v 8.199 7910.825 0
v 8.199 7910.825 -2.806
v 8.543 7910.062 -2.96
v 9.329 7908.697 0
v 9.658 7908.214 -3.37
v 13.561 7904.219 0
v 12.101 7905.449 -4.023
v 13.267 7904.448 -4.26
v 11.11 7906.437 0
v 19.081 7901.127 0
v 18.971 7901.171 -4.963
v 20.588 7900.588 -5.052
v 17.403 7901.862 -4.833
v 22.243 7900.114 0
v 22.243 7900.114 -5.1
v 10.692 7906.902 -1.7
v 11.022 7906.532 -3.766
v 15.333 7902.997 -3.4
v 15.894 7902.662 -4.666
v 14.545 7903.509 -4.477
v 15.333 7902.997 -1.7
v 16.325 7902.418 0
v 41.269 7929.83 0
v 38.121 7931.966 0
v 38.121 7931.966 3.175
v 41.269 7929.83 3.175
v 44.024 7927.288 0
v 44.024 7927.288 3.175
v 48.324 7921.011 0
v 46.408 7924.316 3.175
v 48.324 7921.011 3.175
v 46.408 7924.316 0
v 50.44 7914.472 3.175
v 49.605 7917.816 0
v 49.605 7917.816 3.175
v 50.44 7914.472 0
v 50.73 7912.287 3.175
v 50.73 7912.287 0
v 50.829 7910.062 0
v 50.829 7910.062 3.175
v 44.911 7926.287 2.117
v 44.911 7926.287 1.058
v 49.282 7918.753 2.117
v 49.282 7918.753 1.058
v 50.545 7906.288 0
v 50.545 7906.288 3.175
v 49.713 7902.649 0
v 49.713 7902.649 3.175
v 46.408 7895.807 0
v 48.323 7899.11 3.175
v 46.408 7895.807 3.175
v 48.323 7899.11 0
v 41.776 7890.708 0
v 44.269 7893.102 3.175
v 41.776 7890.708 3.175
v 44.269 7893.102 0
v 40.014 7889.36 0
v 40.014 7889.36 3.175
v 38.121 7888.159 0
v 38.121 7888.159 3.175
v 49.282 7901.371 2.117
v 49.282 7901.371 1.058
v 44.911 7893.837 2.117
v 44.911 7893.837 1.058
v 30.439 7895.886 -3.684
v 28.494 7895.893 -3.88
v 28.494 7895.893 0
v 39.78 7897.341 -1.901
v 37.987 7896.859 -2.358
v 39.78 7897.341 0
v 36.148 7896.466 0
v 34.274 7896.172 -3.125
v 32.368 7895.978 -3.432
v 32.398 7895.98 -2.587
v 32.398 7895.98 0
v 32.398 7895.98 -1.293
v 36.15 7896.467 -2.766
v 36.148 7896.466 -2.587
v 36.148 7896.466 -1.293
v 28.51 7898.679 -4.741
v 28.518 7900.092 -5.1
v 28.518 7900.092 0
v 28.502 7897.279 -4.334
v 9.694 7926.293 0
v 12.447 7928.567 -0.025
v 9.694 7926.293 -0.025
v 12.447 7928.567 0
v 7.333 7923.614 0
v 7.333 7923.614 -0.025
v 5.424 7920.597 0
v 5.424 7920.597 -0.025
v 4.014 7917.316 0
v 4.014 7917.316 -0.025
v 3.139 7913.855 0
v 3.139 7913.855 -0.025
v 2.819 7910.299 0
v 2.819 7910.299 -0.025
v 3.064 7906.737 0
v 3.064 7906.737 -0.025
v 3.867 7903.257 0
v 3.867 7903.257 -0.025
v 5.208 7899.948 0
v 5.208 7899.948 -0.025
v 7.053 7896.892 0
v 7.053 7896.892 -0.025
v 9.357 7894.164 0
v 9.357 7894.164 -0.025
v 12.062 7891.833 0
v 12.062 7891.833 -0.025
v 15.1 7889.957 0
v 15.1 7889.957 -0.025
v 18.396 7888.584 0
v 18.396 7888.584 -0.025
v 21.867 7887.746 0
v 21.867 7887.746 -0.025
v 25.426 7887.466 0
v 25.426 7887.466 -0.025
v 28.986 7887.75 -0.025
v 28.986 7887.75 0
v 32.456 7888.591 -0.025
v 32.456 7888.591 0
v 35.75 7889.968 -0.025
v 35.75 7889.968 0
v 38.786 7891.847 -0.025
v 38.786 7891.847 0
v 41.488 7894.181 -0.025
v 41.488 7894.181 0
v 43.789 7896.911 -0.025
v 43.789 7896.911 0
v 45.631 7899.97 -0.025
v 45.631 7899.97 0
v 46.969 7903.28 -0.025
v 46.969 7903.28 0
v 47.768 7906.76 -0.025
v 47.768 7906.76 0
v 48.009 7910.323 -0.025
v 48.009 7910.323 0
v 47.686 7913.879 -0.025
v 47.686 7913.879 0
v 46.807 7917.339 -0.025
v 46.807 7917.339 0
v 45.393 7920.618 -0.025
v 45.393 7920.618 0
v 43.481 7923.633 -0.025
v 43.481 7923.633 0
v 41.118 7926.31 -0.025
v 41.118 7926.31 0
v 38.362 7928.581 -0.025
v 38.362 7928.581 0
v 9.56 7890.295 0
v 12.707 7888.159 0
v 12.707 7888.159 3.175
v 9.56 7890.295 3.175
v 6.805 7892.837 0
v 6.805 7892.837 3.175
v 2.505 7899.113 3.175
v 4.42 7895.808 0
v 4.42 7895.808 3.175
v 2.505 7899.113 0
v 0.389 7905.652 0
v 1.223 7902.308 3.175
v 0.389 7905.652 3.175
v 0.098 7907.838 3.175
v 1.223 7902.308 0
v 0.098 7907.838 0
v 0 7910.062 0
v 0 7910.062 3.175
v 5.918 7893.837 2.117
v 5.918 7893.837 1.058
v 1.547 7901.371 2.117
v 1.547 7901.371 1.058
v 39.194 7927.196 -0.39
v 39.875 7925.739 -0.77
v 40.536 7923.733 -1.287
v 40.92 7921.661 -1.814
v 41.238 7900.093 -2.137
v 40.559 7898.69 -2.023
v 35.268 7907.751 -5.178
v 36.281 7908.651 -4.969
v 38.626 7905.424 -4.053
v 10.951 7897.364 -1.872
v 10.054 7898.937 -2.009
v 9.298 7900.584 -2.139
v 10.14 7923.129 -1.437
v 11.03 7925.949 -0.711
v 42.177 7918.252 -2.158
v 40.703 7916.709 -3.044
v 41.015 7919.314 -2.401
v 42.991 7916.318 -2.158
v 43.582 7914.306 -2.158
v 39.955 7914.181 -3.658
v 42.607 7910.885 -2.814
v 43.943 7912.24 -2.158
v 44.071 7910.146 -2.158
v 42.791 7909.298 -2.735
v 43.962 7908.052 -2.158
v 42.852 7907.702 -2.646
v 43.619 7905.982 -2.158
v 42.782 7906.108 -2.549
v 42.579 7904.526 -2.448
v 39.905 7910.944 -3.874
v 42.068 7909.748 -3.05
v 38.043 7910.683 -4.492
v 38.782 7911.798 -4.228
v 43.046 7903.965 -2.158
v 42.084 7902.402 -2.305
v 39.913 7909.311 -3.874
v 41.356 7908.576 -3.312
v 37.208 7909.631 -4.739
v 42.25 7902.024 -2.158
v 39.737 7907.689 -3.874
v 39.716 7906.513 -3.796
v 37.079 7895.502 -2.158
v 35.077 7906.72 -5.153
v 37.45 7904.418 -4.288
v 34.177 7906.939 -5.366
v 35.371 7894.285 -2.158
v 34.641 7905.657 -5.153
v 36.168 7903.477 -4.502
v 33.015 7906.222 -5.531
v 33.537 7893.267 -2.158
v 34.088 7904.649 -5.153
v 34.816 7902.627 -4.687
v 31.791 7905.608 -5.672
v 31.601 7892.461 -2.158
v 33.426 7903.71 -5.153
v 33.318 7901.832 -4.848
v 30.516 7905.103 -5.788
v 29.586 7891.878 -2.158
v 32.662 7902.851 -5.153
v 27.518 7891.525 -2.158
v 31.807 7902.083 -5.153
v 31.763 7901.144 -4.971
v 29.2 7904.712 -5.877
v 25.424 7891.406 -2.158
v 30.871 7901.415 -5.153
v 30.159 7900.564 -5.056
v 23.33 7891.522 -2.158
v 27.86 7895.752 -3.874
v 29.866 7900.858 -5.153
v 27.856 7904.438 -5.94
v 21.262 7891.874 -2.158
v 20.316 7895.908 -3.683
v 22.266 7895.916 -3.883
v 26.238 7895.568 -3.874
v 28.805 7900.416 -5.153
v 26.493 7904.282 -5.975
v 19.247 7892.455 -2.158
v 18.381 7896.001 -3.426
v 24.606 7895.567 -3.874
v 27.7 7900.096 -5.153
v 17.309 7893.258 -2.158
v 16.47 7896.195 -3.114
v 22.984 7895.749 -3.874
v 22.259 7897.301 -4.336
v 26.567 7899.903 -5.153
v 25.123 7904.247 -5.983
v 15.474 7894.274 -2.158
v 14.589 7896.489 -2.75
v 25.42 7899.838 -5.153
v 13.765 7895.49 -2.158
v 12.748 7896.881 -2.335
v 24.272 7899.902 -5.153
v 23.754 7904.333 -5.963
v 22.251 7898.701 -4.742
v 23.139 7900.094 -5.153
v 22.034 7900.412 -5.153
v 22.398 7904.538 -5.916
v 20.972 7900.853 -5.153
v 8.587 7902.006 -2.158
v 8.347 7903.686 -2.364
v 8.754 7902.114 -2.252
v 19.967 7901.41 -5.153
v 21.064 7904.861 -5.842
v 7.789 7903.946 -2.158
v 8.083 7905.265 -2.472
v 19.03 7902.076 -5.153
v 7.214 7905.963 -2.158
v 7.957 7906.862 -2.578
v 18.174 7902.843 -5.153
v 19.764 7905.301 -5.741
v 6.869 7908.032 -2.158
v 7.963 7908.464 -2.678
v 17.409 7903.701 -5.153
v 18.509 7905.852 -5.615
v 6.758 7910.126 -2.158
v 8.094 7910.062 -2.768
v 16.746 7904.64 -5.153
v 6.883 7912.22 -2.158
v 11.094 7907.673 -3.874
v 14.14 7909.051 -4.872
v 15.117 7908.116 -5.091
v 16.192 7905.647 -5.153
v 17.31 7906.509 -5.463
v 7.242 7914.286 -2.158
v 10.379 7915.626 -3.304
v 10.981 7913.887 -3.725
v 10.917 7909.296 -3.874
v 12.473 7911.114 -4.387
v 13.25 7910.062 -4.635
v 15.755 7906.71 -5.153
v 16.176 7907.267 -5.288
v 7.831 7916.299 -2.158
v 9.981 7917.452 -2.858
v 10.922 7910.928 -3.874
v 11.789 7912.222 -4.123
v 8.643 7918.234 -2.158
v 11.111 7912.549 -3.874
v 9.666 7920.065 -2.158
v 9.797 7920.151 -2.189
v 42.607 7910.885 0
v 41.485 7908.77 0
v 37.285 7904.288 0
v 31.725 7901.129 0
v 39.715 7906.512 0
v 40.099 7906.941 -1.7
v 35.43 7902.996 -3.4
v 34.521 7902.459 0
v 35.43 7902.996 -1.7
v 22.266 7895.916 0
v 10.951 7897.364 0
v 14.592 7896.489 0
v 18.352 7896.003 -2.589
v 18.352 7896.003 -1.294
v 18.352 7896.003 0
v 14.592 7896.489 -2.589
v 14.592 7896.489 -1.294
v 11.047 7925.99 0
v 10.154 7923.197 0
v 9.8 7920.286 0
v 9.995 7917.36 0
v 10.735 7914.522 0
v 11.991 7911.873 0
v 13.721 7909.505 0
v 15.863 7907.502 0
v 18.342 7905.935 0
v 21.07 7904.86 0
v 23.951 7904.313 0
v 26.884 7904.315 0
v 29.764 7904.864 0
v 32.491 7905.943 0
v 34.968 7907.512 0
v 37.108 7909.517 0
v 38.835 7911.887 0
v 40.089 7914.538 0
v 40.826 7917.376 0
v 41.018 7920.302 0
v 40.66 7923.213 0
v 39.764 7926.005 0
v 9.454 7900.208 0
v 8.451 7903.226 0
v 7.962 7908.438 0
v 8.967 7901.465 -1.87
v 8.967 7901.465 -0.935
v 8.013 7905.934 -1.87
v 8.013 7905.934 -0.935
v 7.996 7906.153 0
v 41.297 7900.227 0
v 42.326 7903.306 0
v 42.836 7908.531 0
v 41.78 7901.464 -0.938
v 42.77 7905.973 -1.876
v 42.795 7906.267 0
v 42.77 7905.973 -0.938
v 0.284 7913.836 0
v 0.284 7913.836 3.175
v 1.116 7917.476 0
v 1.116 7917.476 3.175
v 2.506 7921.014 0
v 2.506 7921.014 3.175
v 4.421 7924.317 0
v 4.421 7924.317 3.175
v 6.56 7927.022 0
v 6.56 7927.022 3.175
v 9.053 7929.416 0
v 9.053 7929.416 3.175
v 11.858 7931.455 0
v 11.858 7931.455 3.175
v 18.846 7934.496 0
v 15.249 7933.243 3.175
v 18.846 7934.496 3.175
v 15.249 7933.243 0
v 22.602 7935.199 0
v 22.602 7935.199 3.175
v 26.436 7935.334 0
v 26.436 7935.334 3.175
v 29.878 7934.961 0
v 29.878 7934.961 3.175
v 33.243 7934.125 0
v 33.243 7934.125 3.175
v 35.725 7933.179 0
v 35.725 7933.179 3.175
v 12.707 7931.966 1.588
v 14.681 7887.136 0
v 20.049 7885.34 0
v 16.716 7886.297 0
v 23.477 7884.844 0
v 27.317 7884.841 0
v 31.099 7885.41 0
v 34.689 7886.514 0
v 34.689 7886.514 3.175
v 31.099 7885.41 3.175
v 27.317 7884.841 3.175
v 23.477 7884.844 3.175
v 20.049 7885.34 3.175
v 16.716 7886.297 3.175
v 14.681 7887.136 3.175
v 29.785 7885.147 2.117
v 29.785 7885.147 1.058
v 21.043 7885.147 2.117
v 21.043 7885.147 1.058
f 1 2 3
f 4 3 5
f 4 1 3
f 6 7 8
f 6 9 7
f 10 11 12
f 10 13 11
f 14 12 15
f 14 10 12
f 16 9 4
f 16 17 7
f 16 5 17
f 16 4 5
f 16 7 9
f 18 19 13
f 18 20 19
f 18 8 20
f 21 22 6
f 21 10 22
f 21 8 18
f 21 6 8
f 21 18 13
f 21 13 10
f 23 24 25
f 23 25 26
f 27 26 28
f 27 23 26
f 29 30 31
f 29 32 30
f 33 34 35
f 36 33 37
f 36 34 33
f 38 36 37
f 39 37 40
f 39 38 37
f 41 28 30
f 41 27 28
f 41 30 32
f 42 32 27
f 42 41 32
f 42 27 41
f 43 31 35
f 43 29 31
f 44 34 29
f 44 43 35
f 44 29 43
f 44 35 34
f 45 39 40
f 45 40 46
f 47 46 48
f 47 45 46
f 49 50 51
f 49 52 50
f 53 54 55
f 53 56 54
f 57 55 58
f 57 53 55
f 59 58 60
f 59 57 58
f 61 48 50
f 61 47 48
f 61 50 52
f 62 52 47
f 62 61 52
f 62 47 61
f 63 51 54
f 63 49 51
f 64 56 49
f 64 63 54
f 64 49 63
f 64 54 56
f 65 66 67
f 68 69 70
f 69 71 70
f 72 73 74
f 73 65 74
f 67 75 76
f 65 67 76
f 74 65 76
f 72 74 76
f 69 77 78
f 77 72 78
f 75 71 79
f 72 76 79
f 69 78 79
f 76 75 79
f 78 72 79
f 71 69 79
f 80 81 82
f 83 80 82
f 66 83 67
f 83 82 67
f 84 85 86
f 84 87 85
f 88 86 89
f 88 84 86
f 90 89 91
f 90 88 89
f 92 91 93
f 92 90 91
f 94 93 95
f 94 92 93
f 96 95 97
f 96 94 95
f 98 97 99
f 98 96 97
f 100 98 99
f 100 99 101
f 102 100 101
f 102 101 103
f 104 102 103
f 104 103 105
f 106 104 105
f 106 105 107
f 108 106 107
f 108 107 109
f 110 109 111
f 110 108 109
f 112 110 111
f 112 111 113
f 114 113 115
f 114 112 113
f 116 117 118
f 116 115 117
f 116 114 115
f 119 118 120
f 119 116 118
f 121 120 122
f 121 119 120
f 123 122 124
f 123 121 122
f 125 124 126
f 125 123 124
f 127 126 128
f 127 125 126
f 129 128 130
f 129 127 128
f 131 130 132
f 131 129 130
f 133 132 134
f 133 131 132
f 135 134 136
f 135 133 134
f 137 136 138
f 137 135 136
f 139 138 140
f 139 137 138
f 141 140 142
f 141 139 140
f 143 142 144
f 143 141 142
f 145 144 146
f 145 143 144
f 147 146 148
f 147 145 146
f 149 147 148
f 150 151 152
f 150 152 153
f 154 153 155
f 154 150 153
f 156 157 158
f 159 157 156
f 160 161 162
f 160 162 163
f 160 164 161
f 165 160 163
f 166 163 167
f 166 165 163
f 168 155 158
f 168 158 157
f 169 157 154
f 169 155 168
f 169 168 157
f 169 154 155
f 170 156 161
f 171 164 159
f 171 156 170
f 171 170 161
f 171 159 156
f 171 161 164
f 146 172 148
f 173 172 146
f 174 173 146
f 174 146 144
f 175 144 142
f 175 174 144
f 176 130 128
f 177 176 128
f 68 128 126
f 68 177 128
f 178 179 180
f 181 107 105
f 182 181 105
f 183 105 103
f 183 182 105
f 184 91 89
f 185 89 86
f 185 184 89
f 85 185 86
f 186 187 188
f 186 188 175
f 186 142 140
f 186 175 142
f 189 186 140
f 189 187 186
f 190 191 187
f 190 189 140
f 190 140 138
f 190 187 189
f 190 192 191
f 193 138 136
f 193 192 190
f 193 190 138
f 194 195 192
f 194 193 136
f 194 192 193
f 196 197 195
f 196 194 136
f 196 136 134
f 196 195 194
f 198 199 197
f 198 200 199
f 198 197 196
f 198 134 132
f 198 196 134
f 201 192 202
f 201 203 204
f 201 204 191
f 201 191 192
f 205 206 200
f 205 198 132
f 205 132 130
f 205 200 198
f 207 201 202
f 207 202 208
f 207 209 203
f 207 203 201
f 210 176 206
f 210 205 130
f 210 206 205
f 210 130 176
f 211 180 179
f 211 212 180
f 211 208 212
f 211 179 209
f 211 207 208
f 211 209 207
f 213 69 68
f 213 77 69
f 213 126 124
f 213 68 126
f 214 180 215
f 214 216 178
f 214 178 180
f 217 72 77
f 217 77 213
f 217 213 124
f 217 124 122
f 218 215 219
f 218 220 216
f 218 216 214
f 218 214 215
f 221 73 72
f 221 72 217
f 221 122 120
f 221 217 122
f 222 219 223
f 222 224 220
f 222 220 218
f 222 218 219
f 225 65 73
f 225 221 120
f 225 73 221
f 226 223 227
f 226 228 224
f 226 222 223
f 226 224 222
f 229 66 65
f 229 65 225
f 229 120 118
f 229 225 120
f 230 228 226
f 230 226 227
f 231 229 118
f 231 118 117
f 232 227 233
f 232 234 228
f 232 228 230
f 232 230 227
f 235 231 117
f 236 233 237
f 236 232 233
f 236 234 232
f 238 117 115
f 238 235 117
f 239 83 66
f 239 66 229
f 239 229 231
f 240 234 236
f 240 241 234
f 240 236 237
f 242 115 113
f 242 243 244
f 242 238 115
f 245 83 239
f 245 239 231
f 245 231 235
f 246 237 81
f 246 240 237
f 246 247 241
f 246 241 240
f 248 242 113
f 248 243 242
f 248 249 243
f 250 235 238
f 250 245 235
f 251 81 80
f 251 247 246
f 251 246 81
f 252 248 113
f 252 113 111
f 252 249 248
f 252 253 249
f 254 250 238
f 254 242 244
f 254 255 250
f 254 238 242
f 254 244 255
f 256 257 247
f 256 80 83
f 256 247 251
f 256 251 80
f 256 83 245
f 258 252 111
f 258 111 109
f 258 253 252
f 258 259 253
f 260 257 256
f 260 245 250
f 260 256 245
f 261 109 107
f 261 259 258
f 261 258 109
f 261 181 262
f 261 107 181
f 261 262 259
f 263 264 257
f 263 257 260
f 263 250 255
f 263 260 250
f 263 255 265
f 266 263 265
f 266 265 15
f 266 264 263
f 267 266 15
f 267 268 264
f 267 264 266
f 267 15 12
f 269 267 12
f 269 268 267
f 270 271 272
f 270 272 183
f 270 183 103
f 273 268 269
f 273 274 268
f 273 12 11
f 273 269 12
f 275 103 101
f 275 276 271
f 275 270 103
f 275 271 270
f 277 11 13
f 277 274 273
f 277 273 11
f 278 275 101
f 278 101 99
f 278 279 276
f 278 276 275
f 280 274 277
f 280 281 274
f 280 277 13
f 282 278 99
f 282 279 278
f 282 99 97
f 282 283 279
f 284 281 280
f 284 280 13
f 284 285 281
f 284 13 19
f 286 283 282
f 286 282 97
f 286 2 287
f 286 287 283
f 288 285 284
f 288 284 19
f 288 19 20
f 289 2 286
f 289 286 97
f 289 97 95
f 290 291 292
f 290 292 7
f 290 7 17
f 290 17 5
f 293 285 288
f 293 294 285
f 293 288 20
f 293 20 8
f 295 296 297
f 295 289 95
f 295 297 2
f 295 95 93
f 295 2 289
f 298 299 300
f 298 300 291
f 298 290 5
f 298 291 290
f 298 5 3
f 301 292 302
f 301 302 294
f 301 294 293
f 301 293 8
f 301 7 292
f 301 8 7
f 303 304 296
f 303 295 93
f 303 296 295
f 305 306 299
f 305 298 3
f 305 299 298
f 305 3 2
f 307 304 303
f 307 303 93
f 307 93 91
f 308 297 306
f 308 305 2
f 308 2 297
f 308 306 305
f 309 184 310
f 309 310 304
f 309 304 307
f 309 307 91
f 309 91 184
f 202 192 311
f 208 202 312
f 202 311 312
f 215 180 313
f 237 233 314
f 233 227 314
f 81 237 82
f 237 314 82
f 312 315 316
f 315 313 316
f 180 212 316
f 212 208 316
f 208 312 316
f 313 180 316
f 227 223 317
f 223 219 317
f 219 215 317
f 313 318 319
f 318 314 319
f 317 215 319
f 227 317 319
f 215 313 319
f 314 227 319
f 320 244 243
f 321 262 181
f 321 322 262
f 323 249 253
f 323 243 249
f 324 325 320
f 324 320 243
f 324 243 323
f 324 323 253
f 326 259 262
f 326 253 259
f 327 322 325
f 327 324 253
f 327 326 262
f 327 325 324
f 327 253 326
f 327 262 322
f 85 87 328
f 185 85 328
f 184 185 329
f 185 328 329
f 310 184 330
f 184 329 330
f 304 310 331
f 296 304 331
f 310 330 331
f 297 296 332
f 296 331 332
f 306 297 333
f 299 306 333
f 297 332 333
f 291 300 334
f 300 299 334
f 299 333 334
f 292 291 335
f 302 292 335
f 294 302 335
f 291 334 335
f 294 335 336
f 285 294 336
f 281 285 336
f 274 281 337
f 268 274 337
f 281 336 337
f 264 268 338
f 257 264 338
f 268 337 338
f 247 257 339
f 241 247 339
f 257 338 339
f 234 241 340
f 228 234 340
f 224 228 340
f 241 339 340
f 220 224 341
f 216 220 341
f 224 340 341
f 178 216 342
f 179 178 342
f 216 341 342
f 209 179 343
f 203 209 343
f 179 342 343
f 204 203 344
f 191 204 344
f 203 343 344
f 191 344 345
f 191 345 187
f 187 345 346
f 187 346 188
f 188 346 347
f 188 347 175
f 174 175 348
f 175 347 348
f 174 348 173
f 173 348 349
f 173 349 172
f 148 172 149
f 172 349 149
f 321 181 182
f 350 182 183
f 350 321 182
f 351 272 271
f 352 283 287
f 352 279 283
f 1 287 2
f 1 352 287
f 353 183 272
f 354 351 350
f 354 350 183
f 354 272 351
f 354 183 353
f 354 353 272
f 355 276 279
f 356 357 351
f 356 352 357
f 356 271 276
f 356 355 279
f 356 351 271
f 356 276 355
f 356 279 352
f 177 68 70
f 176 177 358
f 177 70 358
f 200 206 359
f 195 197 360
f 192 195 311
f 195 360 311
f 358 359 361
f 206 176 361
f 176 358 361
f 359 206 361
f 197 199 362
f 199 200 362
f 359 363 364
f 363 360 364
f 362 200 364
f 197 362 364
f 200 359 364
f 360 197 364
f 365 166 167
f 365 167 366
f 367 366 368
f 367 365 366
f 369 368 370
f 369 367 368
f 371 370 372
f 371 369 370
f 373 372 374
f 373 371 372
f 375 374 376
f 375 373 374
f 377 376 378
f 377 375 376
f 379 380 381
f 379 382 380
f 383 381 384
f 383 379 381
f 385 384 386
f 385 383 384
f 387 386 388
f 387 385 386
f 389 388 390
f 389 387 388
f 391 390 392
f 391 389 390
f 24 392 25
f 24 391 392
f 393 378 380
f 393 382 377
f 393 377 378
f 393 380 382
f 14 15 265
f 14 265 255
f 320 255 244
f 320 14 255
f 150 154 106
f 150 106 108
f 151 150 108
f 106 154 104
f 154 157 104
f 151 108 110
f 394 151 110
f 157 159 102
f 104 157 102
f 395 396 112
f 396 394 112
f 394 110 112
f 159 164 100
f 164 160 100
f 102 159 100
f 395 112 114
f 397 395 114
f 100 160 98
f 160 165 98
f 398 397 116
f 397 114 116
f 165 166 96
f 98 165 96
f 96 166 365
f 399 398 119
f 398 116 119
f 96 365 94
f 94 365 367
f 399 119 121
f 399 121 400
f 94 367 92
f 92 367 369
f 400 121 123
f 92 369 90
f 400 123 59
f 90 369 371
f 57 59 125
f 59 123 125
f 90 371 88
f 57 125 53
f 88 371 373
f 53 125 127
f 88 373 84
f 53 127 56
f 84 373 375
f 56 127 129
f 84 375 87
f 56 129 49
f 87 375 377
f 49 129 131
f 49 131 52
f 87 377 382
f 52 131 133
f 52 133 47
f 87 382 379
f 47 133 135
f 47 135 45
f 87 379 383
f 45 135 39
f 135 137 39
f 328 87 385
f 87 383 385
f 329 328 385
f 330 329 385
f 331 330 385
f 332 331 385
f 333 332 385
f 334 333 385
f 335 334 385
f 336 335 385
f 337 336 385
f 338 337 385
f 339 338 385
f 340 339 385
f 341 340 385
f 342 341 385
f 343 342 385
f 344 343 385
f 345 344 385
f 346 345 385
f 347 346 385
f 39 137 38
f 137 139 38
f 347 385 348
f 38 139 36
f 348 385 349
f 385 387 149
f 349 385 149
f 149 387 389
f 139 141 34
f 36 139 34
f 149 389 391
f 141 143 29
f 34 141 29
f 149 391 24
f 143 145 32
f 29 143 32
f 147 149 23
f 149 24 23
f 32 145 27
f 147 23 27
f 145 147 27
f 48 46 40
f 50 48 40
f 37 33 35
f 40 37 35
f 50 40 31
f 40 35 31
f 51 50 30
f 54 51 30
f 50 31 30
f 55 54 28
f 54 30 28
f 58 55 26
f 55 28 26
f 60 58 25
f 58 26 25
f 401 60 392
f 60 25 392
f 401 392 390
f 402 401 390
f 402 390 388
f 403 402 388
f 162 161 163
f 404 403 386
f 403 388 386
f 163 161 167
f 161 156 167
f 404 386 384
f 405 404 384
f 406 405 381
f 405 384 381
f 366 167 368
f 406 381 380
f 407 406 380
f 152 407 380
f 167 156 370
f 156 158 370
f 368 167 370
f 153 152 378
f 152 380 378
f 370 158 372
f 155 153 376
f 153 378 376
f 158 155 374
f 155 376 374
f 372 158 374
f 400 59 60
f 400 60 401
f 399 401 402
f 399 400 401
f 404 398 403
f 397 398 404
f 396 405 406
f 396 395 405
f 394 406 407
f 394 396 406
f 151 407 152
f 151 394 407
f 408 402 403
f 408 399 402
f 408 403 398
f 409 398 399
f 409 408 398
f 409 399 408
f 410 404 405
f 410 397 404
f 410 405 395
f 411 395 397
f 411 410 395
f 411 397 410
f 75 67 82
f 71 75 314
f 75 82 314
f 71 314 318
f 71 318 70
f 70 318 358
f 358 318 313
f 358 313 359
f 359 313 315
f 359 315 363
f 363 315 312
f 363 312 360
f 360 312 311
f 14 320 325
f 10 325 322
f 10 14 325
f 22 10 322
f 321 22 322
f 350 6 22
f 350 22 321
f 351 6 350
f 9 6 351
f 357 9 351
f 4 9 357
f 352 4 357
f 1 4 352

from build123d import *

# Parameters (mm, degrees)
BOSS_EXTRUDE1_DEPTH = 3.175
SKETCH3_R           = 22.596080088
BOSS_EXTRUDE2_DEPTH = 0.0254
DOME1_FACE_RADIUS   = 22.596080088
DOME1_HEIGHT        = 6.35
SKETCH4_R           = 15.615239036
CUT_EXTRUDE1_DEPTH  = 7.6454


with BuildPart() as part:
    # Sketch1 → Boss-Extrude1 (new body)
    with BuildSketch(Plane.XY):
        with BuildLine():
            add(Edge.make_bspline(
                [(50.828602384, 7910.062180707), (50.828602053, 7901.026169372), (45.984663658, 7892.676550548), (38.121451499, 7888.158544715)],
                knots=[0, 0, 0, 0, 1, 1, 1, 1], degree=3))
            add(Edge.make_bspline(
                [(38.121451499, 7888.158544715), (30.258239339, 7883.640539048), (20.570362548, 7883.640539048), (12.707150389, 7888.158544715)],
                knots=[0, 0, 0, 0, 1, 1, 1, 1], degree=3))
            add(Edge.make_bspline(
                [(12.707150389, 7888.158544715), (4.84393823, 7892.676550548), (-1.66e-07, 7901.026169372), (1.66e-07, 7910.062180707)],
                knots=[0, 0, 0, 0, 1, 1, 1, 1], degree=3))
            add(Edge.make_bspline(
                [(1.66e-07, 7910.062180707), (1.66e-07, 7919.098192041), (4.843938561, 7927.447810866), (12.70715072, 7931.965816533)],
                knots=[0, 0, 0, 0, 1, 1, 1, 1], degree=3))
            add(Edge.make_bspline(
                [(12.70715072, 7931.965816533), (20.570362879, 7936.4838222), (30.25823967, 7936.4838222), (38.12145183, 7931.965816533)],
                knots=[0, 0, 0, 0, 1, 1, 1, 1], degree=3))
            add(Edge.make_bspline(
                [(38.12145183, 7931.965816533), (45.984663989, 7927.447810866), (50.828602384, 7919.098192041), (50.828602384, 7910.062180707)],
                knots=[0, 0, 0, 0, 1, 1, 1, 1], degree=3))
        make_face()
    extrude(amount=BOSS_EXTRUDE1_DEPTH)

    # Sketch3 → Boss-Extrude2 (add)
    with BuildSketch(Plane.XY):
        with Locations((25.414301275, 7910.062180707)):
            Circle(SKETCH3_R)
    extrude(amount=-BOSS_EXTRUDE2_DEPTH)

    # Dome1: a dome of height H over a round flat face of radius A is a cap of a sphere of radius (A * A + H * H) / (2 * H)
    dome1_r = (DOME1_FACE_RADIUS * DOME1_FACE_RADIUS + DOME1_HEIGHT * DOME1_HEIGHT) / (2 * DOME1_HEIGHT)
    dome1_base = Plane((25.414301275, 7910.062180707, -0.0254), z_dir=(0, 0, -1))
    with Locations(dome1_base.offset(DOME1_HEIGHT - dome1_r)):
        dome1_ball = Sphere(dome1_r, mode=Mode.PRIVATE)
    add(split(dome1_ball, bisect_by=dome1_base, keep=Keep.TOP, mode=Mode.PRIVATE))

    # Sketch4 → Cut-Extrude1 (cut)
    with BuildSketch(Plane.XY):
        with Locations((25.409073045, 7919.859985206)):
            Circle(SKETCH4_R)
        with BuildLine():
            Line((28.51760754, 7900.091765684), (28.494324255, 7895.893452368))
            add(Edge.make_bspline(
                [(28.494324255, 7895.893452368), (32.487462639, 7895.777439774), (36.195197067, 7896.275514066), (39.779692278, 7897.341394667)],
                knots=[0, 0, 0, 0, 1, 1, 1, 1], degree=3))
            add(Edge.make_bspline(
                [(39.779692278, 7897.341394667), (42.236438359, 7901.275546963), (43.39540576, 7905.766244587), (42.606935871, 7910.885075863)],
                knots=[0, 0, 0, 0, 1, 1, 1, 1], degree=3))
            add(Edge.make_bspline(
                [(42.606935871, 7910.885075863), (41.151916565, 7907.286794723), (36.579479185, 7902.130368587), (28.51760754, 7900.091765684)],
                knots=[0, 0, 0, 0, 1, 1, 1, 1], degree=3))
        make_face()
        with BuildLine():
            Line((22.24306336, 7900.114149944), (22.266408875, 7895.915841924))
            add(Edge.make_bspline(
                [(22.266408875, 7895.915841924), (18.262512647, 7895.79981609), (14.544790967, 7896.297898327), (10.950640012, 7897.363778928)],
                knots=[0, 0, 0, 0, 1, 1, 1, 1], degree=3))
            add(Edge.make_bspline(
                [(10.950640012, 7897.363778928), (8.487275043, 7901.297931223), (7.408160638, 7905.705876198), (8.198755615, 7910.824707474)],
                knots=[0, 0, 0, 0, 1, 1, 1, 1], degree=3))
            add(Edge.make_bspline(
                [(8.198755615, 7910.824707474), (9.657694086, 7907.226426334), (14.159473448, 7902.152752848), (22.24306336, 7900.114149944)],
                knots=[0, 0, 0, 0, 1, 1, 1, 1], degree=3))
        make_face()
    extrude(amount=-CUT_EXTRUDE1_DEPTH, mode=Mode.SUBTRACT)


solid = part.part
